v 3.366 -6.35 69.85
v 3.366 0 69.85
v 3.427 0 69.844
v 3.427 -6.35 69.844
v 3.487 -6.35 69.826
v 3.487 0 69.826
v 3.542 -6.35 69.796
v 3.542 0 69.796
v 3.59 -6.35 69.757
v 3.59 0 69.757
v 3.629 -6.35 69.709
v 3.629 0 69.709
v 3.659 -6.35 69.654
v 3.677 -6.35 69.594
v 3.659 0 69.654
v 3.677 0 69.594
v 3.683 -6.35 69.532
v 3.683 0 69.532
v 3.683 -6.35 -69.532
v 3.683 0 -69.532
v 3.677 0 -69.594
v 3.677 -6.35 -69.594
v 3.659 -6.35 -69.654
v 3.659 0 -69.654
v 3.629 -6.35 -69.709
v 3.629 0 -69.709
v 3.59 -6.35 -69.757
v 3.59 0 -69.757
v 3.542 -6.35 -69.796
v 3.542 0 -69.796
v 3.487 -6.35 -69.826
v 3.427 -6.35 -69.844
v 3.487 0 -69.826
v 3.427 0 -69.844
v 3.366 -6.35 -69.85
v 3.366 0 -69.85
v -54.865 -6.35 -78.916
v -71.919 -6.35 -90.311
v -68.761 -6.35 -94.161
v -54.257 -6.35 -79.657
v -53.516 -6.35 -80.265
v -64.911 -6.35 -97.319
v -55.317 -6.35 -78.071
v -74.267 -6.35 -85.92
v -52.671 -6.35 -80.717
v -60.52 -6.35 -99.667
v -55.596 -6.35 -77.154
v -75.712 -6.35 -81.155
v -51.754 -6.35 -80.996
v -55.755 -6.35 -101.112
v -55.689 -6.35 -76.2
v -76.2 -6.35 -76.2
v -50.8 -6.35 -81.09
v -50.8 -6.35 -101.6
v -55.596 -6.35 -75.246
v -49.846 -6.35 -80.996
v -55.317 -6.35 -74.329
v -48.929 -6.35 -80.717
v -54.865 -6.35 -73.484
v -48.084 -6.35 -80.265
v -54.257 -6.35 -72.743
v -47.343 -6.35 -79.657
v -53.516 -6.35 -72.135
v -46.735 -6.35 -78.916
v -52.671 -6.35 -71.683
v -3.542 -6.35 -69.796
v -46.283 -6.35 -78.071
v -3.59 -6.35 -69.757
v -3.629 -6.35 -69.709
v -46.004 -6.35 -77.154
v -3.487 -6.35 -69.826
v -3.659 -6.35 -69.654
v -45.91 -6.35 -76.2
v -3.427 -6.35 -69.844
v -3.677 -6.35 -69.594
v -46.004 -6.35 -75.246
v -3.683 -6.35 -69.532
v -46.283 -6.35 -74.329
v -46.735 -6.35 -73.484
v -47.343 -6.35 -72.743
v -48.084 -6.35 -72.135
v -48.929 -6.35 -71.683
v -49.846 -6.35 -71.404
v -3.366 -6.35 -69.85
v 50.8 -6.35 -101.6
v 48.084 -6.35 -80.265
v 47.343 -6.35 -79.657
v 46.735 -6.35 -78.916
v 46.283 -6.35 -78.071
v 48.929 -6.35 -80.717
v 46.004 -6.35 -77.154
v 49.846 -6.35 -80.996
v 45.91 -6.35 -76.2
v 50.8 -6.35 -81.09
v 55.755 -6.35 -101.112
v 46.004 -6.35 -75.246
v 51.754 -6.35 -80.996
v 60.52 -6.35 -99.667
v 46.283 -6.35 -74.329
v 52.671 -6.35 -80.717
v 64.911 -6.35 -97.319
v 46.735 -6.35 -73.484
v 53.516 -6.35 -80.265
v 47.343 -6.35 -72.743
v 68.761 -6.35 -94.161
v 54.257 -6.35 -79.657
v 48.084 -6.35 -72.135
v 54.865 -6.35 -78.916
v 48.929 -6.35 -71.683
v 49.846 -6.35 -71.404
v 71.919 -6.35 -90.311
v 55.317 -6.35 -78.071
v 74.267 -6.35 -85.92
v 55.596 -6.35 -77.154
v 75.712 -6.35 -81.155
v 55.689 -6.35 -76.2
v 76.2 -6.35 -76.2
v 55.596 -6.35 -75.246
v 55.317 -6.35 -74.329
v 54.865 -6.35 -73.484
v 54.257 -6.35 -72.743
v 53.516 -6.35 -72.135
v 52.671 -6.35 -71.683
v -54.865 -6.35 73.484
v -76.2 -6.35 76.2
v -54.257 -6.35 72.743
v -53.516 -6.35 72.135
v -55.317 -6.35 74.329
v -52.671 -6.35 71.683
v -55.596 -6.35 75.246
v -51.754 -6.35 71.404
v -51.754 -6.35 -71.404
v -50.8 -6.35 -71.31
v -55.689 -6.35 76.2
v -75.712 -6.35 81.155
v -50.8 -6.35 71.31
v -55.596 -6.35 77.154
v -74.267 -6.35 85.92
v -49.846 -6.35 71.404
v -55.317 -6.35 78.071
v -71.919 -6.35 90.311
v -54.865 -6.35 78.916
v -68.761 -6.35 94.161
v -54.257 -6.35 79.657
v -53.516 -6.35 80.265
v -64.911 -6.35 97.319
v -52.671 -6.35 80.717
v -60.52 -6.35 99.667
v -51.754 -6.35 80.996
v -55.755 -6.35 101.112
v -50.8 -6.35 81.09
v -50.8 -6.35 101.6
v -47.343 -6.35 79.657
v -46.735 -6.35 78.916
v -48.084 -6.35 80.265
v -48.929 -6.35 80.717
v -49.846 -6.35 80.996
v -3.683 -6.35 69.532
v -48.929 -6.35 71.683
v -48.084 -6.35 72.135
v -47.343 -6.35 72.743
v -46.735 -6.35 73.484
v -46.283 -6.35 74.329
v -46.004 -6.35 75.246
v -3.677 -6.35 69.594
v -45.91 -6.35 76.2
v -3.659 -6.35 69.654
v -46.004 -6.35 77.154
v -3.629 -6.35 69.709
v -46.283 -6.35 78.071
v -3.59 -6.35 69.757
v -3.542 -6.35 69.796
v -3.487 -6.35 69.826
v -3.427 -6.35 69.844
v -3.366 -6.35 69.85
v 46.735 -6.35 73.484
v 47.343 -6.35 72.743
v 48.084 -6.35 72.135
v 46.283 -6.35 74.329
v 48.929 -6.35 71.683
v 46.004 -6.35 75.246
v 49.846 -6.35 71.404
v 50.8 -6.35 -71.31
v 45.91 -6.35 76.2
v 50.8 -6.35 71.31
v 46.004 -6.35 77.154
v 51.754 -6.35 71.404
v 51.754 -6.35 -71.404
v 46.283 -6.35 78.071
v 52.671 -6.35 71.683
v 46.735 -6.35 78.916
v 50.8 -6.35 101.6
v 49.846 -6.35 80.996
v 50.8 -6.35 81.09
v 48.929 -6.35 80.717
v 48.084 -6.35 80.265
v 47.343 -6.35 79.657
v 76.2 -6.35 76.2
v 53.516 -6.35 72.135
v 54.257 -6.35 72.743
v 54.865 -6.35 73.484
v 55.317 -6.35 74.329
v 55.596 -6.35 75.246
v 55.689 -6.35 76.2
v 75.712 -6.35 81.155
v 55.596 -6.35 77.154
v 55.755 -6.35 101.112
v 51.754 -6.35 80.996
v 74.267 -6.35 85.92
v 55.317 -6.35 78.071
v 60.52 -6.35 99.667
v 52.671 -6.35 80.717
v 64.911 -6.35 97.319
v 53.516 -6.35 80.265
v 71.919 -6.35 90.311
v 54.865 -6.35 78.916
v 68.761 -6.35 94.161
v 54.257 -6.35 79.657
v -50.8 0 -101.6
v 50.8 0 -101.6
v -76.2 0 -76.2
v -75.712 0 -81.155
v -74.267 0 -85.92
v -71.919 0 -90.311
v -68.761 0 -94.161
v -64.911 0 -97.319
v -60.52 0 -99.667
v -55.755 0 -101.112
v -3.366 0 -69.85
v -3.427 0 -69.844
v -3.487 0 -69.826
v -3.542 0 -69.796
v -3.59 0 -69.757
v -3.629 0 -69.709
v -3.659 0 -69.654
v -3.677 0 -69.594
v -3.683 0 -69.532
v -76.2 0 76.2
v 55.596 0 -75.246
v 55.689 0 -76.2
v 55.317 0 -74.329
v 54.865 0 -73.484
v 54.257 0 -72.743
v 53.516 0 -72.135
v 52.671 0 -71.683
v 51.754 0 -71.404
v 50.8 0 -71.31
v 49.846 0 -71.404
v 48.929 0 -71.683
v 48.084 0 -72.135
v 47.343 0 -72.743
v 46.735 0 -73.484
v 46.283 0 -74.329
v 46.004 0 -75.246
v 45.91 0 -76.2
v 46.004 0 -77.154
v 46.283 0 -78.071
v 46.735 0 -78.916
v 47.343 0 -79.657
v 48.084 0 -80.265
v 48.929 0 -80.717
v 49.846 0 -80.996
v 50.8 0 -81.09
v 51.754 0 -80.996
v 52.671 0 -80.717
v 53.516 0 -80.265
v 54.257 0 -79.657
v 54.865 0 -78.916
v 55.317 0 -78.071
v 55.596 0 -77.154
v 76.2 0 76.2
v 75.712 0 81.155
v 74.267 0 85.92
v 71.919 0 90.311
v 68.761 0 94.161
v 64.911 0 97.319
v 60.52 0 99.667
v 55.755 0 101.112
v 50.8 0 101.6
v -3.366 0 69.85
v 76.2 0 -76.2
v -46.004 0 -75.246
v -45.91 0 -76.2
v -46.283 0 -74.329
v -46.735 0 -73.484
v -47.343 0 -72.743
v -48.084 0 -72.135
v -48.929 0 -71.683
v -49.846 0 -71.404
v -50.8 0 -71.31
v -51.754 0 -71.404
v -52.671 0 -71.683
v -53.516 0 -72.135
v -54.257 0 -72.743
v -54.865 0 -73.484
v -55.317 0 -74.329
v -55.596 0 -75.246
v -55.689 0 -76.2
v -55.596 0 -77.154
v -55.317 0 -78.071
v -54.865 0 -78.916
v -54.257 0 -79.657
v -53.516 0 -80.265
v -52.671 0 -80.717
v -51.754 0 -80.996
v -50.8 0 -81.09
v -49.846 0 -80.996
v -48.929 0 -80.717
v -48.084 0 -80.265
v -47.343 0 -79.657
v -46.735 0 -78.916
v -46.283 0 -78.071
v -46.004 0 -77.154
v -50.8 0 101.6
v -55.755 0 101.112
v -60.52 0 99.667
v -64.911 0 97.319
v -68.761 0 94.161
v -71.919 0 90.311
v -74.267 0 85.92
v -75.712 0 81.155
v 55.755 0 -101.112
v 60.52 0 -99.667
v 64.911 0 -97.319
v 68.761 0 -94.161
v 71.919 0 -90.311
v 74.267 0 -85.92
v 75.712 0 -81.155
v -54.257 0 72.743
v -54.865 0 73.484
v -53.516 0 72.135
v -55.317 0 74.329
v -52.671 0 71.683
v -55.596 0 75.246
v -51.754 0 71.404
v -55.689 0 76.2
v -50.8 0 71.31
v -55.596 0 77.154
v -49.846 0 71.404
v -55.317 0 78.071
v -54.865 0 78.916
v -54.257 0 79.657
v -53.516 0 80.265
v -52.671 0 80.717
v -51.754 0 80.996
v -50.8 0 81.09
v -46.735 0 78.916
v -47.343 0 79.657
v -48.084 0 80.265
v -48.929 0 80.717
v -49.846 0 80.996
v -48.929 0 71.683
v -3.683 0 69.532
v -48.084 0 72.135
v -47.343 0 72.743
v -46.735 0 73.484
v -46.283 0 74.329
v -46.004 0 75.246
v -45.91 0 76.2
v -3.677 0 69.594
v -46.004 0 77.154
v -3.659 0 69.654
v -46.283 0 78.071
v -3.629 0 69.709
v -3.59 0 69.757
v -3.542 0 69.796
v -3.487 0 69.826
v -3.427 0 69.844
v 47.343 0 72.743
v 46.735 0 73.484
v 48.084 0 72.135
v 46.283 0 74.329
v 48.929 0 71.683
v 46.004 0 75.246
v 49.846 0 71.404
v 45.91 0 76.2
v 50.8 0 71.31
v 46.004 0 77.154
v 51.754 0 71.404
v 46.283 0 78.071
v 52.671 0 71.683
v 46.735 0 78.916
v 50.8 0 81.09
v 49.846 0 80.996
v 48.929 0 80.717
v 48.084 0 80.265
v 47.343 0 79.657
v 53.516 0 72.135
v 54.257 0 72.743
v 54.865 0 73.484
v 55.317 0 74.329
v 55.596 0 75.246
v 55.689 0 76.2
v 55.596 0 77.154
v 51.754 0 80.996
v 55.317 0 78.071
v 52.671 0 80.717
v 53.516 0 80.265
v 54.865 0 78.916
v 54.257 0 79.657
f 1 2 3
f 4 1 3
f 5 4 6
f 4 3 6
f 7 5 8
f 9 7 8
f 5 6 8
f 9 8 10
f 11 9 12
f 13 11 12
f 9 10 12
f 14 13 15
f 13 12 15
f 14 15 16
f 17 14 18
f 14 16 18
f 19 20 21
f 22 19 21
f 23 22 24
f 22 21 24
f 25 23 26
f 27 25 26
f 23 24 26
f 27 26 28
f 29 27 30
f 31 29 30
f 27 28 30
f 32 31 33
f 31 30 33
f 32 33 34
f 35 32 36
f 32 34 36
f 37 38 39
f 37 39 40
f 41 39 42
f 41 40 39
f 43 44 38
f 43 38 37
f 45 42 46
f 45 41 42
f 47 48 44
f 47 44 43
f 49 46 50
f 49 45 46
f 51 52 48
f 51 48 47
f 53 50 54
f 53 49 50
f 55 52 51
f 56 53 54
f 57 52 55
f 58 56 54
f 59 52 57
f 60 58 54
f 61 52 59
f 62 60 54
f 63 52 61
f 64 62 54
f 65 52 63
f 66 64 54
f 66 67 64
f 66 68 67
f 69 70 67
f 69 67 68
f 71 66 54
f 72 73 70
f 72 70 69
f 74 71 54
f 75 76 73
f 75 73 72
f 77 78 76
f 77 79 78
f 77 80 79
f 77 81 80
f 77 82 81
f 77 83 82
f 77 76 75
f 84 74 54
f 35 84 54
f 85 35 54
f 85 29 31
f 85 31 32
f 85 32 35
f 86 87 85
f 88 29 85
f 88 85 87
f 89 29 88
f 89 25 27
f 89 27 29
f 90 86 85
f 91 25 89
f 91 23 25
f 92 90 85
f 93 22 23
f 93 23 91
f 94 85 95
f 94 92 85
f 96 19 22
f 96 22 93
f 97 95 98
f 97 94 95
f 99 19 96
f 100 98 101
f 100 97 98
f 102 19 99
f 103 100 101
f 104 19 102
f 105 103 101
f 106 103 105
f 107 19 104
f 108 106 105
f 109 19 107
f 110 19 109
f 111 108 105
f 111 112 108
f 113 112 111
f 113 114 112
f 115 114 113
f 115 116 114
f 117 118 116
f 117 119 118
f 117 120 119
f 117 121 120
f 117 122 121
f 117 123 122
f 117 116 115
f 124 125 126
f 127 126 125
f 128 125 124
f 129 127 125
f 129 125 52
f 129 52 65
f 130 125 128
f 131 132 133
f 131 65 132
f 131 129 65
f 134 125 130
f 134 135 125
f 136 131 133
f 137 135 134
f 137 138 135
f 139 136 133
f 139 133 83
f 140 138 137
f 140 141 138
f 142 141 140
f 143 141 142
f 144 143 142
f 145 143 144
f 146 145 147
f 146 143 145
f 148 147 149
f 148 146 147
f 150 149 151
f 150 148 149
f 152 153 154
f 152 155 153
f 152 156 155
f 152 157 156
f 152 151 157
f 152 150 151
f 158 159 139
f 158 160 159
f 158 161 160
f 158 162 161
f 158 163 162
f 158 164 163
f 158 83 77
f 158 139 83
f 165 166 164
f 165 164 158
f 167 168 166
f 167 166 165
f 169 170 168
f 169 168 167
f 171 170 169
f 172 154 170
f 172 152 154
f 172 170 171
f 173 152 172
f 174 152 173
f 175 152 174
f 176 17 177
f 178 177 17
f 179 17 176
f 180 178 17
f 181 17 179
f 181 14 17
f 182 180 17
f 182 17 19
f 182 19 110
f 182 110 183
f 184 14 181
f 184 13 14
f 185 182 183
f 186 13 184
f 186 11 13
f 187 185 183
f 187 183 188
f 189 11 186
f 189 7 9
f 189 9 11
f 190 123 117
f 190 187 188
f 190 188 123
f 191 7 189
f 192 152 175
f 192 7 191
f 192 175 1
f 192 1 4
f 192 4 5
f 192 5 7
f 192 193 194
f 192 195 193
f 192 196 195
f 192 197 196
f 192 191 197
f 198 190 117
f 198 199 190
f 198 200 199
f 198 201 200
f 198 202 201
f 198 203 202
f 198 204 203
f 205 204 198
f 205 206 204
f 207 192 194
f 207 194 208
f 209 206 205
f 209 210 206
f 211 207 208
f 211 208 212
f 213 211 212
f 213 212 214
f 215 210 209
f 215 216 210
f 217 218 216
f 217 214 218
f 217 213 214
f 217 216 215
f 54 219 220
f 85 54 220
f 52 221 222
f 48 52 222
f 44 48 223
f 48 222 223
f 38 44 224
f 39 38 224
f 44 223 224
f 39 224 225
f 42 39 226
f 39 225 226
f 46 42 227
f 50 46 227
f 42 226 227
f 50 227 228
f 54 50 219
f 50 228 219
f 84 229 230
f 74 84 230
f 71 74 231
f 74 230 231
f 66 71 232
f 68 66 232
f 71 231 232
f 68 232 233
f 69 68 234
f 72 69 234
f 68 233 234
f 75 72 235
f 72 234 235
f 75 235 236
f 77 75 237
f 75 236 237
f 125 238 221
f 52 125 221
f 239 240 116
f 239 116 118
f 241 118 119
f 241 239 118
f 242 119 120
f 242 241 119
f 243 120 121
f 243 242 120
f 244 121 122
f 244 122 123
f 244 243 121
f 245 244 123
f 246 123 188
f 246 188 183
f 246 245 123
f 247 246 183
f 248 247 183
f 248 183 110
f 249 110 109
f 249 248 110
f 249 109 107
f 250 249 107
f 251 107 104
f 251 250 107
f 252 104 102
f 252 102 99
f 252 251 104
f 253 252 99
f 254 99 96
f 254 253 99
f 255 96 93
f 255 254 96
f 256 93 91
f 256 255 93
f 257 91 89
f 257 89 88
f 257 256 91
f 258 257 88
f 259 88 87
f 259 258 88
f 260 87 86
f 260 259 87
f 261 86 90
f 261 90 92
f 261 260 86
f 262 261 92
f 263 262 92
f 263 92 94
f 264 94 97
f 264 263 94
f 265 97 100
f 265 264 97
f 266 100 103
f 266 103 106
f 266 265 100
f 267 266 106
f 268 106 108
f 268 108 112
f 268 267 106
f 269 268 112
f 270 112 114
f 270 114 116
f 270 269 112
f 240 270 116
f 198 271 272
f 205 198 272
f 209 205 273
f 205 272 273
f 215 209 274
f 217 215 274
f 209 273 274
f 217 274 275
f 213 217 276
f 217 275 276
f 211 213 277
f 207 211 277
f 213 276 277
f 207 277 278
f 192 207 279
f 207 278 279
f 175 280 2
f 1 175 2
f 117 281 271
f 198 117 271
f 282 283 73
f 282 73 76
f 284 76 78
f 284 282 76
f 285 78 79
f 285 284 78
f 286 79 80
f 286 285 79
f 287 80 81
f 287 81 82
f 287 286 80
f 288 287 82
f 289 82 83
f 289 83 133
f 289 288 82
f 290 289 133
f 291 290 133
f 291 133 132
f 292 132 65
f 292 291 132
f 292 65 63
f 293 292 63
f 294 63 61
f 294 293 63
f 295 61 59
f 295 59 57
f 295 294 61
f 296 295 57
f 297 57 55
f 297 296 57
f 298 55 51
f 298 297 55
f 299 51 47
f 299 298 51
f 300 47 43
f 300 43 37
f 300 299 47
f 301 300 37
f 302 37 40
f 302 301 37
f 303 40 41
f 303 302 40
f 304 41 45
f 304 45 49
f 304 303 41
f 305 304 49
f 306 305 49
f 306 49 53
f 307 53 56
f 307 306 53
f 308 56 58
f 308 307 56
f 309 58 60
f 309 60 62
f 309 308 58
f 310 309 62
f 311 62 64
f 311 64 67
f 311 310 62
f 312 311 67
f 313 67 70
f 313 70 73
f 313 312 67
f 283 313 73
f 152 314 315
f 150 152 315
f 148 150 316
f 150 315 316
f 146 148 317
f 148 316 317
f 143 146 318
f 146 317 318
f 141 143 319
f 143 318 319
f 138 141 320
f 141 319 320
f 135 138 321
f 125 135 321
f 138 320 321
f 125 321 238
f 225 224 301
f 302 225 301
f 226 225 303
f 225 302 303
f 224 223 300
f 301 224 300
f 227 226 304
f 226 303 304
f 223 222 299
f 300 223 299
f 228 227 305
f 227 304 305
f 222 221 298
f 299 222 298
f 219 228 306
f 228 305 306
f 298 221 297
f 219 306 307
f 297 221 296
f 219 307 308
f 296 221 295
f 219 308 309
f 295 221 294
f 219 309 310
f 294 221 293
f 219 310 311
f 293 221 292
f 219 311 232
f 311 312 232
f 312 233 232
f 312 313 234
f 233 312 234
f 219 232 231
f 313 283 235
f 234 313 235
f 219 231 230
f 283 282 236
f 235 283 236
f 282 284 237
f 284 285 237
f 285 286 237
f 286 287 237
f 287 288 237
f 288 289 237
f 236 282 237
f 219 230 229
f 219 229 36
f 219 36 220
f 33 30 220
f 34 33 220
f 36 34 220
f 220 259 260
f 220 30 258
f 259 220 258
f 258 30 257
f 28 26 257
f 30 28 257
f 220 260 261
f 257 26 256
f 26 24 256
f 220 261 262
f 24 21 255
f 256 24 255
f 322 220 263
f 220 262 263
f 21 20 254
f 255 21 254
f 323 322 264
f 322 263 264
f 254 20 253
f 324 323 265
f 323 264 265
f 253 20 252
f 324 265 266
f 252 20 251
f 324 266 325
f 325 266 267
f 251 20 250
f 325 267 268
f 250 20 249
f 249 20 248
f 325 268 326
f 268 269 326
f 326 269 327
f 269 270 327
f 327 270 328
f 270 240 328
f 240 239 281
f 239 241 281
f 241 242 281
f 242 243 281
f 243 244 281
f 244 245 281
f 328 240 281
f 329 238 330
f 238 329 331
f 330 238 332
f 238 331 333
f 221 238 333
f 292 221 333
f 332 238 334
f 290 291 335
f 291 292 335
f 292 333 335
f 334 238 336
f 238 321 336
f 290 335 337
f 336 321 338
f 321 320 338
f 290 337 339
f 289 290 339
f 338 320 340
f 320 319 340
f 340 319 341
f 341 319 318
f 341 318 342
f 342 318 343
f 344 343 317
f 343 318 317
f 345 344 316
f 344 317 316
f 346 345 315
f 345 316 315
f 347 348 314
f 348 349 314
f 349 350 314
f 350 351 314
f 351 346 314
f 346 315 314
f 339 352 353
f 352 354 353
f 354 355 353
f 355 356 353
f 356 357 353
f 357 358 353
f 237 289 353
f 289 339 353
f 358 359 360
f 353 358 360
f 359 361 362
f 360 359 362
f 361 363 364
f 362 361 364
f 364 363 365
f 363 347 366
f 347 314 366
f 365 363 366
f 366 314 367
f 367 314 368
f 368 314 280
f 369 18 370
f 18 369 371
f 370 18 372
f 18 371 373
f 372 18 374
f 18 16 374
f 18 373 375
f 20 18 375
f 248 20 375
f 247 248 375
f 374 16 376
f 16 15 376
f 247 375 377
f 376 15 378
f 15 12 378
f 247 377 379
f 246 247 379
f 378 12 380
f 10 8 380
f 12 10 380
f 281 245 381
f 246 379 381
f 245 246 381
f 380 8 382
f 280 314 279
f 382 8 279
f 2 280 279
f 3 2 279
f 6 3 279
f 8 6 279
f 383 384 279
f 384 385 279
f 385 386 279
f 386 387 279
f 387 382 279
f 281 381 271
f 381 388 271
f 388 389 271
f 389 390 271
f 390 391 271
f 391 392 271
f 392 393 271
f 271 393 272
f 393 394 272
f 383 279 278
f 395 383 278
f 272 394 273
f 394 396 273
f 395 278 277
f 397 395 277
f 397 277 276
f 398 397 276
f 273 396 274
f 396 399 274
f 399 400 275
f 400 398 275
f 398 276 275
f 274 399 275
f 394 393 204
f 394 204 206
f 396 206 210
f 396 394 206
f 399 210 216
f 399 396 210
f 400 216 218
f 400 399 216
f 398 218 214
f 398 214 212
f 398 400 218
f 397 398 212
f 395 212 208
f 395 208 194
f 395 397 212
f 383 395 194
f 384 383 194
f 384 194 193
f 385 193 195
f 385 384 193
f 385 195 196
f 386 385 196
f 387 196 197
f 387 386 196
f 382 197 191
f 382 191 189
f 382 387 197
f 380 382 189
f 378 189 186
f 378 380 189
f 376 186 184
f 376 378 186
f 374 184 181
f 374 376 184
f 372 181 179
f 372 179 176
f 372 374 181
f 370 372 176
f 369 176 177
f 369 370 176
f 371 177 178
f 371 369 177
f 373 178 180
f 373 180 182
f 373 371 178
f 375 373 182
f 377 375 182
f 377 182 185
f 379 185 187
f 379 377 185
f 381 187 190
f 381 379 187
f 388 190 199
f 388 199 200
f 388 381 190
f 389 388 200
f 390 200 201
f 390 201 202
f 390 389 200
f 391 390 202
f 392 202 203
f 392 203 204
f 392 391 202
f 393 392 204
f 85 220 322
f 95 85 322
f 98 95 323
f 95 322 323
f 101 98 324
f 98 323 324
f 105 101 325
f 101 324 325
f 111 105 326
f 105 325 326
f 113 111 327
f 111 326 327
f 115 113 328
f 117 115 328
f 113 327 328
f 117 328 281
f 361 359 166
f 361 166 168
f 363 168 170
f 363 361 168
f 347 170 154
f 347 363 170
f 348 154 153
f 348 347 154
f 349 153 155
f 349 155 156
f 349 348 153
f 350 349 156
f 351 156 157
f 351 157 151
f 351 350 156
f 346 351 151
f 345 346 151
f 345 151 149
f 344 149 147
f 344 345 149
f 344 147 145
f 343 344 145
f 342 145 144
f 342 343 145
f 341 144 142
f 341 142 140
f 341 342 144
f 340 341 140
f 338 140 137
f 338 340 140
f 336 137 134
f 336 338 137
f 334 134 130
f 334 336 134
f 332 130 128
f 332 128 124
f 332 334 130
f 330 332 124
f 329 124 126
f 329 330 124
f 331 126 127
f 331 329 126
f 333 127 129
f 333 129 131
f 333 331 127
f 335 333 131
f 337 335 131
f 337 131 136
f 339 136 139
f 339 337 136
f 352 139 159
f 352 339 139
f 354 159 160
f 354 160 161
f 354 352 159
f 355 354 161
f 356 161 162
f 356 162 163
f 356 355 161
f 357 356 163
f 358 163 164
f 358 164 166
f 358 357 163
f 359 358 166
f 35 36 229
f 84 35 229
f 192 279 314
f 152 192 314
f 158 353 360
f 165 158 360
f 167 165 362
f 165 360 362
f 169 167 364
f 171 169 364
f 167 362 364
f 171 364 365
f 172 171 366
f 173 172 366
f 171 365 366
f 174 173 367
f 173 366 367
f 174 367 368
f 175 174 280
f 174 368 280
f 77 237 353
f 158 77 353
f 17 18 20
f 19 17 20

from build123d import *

# Parameters (mm, degrees)
F0_R     = 4.8895
F1_DEPTH = 6.35


with BuildPart() as f1:
    # F0 (on Front) → F1 (new body)
    with BuildSketch(Plane.XZ):
        with BuildLine():
            ThreePointArc((-76.2, -76.2), (-68.760512, -94.160512), (-50.8, -101.6))
            Line((-50.8, -101.6), (50.8, -101.6))
            ThreePointArc((50.8, -101.6), (68.760512, -94.160512), (76.2, -76.2))
            Line((76.2, -76.2), (76.2, 76.2))
            ThreePointArc((76.2, 76.2), (68.760512, 94.160512), (50.8, 101.6))
            Line((50.8, 101.6), (-50.8, 101.6))
            ThreePointArc((-50.8, 101.6), (-68.760512, 94.160512), (-76.2, 76.2))
            Line((-76.2, 76.2), (-76.2, -76.2))
        make_face()
        with Locations((-50.8, -76.2)):
            Circle(F0_R, mode=Mode.SUBTRACT)
        with BuildLine():
            Line((3.3655, -69.85), (-3.3655, -69.85))
            ThreePointArc((-3.3655, -69.85), (-3.590006, -69.757006), (-3.683, -69.5325))
            Line((-3.683, -69.5325), (-3.683, 69.5325))
            ThreePointArc((-3.683, 69.5325), (-3.590006, 69.757006), (-3.3655, 69.85))
            Line((-3.3655, 69.85), (3.3655, 69.85))
            ThreePointArc((3.3655, 69.85), (3.590006, 69.757006), (3.683, 69.5325))
            Line((3.683, 69.5325), (3.683, -69.5325))
            ThreePointArc((3.683, -69.5325), (3.590006, -69.757006), (3.3655, -69.85))
        make_face(mode=Mode.SUBTRACT)
        with Locations((50.8, -76.2)):
            Circle(F0_R, mode=Mode.SUBTRACT)
        with Locations((-50.8, 76.2)):
            Circle(F0_R, mode=Mode.SUBTRACT)
        with Locations((50.8, 76.2)):
            Circle(F0_R, mode=Mode.SUBTRACT)
    extrude(amount=F1_DEPTH)


solid = f1.part
